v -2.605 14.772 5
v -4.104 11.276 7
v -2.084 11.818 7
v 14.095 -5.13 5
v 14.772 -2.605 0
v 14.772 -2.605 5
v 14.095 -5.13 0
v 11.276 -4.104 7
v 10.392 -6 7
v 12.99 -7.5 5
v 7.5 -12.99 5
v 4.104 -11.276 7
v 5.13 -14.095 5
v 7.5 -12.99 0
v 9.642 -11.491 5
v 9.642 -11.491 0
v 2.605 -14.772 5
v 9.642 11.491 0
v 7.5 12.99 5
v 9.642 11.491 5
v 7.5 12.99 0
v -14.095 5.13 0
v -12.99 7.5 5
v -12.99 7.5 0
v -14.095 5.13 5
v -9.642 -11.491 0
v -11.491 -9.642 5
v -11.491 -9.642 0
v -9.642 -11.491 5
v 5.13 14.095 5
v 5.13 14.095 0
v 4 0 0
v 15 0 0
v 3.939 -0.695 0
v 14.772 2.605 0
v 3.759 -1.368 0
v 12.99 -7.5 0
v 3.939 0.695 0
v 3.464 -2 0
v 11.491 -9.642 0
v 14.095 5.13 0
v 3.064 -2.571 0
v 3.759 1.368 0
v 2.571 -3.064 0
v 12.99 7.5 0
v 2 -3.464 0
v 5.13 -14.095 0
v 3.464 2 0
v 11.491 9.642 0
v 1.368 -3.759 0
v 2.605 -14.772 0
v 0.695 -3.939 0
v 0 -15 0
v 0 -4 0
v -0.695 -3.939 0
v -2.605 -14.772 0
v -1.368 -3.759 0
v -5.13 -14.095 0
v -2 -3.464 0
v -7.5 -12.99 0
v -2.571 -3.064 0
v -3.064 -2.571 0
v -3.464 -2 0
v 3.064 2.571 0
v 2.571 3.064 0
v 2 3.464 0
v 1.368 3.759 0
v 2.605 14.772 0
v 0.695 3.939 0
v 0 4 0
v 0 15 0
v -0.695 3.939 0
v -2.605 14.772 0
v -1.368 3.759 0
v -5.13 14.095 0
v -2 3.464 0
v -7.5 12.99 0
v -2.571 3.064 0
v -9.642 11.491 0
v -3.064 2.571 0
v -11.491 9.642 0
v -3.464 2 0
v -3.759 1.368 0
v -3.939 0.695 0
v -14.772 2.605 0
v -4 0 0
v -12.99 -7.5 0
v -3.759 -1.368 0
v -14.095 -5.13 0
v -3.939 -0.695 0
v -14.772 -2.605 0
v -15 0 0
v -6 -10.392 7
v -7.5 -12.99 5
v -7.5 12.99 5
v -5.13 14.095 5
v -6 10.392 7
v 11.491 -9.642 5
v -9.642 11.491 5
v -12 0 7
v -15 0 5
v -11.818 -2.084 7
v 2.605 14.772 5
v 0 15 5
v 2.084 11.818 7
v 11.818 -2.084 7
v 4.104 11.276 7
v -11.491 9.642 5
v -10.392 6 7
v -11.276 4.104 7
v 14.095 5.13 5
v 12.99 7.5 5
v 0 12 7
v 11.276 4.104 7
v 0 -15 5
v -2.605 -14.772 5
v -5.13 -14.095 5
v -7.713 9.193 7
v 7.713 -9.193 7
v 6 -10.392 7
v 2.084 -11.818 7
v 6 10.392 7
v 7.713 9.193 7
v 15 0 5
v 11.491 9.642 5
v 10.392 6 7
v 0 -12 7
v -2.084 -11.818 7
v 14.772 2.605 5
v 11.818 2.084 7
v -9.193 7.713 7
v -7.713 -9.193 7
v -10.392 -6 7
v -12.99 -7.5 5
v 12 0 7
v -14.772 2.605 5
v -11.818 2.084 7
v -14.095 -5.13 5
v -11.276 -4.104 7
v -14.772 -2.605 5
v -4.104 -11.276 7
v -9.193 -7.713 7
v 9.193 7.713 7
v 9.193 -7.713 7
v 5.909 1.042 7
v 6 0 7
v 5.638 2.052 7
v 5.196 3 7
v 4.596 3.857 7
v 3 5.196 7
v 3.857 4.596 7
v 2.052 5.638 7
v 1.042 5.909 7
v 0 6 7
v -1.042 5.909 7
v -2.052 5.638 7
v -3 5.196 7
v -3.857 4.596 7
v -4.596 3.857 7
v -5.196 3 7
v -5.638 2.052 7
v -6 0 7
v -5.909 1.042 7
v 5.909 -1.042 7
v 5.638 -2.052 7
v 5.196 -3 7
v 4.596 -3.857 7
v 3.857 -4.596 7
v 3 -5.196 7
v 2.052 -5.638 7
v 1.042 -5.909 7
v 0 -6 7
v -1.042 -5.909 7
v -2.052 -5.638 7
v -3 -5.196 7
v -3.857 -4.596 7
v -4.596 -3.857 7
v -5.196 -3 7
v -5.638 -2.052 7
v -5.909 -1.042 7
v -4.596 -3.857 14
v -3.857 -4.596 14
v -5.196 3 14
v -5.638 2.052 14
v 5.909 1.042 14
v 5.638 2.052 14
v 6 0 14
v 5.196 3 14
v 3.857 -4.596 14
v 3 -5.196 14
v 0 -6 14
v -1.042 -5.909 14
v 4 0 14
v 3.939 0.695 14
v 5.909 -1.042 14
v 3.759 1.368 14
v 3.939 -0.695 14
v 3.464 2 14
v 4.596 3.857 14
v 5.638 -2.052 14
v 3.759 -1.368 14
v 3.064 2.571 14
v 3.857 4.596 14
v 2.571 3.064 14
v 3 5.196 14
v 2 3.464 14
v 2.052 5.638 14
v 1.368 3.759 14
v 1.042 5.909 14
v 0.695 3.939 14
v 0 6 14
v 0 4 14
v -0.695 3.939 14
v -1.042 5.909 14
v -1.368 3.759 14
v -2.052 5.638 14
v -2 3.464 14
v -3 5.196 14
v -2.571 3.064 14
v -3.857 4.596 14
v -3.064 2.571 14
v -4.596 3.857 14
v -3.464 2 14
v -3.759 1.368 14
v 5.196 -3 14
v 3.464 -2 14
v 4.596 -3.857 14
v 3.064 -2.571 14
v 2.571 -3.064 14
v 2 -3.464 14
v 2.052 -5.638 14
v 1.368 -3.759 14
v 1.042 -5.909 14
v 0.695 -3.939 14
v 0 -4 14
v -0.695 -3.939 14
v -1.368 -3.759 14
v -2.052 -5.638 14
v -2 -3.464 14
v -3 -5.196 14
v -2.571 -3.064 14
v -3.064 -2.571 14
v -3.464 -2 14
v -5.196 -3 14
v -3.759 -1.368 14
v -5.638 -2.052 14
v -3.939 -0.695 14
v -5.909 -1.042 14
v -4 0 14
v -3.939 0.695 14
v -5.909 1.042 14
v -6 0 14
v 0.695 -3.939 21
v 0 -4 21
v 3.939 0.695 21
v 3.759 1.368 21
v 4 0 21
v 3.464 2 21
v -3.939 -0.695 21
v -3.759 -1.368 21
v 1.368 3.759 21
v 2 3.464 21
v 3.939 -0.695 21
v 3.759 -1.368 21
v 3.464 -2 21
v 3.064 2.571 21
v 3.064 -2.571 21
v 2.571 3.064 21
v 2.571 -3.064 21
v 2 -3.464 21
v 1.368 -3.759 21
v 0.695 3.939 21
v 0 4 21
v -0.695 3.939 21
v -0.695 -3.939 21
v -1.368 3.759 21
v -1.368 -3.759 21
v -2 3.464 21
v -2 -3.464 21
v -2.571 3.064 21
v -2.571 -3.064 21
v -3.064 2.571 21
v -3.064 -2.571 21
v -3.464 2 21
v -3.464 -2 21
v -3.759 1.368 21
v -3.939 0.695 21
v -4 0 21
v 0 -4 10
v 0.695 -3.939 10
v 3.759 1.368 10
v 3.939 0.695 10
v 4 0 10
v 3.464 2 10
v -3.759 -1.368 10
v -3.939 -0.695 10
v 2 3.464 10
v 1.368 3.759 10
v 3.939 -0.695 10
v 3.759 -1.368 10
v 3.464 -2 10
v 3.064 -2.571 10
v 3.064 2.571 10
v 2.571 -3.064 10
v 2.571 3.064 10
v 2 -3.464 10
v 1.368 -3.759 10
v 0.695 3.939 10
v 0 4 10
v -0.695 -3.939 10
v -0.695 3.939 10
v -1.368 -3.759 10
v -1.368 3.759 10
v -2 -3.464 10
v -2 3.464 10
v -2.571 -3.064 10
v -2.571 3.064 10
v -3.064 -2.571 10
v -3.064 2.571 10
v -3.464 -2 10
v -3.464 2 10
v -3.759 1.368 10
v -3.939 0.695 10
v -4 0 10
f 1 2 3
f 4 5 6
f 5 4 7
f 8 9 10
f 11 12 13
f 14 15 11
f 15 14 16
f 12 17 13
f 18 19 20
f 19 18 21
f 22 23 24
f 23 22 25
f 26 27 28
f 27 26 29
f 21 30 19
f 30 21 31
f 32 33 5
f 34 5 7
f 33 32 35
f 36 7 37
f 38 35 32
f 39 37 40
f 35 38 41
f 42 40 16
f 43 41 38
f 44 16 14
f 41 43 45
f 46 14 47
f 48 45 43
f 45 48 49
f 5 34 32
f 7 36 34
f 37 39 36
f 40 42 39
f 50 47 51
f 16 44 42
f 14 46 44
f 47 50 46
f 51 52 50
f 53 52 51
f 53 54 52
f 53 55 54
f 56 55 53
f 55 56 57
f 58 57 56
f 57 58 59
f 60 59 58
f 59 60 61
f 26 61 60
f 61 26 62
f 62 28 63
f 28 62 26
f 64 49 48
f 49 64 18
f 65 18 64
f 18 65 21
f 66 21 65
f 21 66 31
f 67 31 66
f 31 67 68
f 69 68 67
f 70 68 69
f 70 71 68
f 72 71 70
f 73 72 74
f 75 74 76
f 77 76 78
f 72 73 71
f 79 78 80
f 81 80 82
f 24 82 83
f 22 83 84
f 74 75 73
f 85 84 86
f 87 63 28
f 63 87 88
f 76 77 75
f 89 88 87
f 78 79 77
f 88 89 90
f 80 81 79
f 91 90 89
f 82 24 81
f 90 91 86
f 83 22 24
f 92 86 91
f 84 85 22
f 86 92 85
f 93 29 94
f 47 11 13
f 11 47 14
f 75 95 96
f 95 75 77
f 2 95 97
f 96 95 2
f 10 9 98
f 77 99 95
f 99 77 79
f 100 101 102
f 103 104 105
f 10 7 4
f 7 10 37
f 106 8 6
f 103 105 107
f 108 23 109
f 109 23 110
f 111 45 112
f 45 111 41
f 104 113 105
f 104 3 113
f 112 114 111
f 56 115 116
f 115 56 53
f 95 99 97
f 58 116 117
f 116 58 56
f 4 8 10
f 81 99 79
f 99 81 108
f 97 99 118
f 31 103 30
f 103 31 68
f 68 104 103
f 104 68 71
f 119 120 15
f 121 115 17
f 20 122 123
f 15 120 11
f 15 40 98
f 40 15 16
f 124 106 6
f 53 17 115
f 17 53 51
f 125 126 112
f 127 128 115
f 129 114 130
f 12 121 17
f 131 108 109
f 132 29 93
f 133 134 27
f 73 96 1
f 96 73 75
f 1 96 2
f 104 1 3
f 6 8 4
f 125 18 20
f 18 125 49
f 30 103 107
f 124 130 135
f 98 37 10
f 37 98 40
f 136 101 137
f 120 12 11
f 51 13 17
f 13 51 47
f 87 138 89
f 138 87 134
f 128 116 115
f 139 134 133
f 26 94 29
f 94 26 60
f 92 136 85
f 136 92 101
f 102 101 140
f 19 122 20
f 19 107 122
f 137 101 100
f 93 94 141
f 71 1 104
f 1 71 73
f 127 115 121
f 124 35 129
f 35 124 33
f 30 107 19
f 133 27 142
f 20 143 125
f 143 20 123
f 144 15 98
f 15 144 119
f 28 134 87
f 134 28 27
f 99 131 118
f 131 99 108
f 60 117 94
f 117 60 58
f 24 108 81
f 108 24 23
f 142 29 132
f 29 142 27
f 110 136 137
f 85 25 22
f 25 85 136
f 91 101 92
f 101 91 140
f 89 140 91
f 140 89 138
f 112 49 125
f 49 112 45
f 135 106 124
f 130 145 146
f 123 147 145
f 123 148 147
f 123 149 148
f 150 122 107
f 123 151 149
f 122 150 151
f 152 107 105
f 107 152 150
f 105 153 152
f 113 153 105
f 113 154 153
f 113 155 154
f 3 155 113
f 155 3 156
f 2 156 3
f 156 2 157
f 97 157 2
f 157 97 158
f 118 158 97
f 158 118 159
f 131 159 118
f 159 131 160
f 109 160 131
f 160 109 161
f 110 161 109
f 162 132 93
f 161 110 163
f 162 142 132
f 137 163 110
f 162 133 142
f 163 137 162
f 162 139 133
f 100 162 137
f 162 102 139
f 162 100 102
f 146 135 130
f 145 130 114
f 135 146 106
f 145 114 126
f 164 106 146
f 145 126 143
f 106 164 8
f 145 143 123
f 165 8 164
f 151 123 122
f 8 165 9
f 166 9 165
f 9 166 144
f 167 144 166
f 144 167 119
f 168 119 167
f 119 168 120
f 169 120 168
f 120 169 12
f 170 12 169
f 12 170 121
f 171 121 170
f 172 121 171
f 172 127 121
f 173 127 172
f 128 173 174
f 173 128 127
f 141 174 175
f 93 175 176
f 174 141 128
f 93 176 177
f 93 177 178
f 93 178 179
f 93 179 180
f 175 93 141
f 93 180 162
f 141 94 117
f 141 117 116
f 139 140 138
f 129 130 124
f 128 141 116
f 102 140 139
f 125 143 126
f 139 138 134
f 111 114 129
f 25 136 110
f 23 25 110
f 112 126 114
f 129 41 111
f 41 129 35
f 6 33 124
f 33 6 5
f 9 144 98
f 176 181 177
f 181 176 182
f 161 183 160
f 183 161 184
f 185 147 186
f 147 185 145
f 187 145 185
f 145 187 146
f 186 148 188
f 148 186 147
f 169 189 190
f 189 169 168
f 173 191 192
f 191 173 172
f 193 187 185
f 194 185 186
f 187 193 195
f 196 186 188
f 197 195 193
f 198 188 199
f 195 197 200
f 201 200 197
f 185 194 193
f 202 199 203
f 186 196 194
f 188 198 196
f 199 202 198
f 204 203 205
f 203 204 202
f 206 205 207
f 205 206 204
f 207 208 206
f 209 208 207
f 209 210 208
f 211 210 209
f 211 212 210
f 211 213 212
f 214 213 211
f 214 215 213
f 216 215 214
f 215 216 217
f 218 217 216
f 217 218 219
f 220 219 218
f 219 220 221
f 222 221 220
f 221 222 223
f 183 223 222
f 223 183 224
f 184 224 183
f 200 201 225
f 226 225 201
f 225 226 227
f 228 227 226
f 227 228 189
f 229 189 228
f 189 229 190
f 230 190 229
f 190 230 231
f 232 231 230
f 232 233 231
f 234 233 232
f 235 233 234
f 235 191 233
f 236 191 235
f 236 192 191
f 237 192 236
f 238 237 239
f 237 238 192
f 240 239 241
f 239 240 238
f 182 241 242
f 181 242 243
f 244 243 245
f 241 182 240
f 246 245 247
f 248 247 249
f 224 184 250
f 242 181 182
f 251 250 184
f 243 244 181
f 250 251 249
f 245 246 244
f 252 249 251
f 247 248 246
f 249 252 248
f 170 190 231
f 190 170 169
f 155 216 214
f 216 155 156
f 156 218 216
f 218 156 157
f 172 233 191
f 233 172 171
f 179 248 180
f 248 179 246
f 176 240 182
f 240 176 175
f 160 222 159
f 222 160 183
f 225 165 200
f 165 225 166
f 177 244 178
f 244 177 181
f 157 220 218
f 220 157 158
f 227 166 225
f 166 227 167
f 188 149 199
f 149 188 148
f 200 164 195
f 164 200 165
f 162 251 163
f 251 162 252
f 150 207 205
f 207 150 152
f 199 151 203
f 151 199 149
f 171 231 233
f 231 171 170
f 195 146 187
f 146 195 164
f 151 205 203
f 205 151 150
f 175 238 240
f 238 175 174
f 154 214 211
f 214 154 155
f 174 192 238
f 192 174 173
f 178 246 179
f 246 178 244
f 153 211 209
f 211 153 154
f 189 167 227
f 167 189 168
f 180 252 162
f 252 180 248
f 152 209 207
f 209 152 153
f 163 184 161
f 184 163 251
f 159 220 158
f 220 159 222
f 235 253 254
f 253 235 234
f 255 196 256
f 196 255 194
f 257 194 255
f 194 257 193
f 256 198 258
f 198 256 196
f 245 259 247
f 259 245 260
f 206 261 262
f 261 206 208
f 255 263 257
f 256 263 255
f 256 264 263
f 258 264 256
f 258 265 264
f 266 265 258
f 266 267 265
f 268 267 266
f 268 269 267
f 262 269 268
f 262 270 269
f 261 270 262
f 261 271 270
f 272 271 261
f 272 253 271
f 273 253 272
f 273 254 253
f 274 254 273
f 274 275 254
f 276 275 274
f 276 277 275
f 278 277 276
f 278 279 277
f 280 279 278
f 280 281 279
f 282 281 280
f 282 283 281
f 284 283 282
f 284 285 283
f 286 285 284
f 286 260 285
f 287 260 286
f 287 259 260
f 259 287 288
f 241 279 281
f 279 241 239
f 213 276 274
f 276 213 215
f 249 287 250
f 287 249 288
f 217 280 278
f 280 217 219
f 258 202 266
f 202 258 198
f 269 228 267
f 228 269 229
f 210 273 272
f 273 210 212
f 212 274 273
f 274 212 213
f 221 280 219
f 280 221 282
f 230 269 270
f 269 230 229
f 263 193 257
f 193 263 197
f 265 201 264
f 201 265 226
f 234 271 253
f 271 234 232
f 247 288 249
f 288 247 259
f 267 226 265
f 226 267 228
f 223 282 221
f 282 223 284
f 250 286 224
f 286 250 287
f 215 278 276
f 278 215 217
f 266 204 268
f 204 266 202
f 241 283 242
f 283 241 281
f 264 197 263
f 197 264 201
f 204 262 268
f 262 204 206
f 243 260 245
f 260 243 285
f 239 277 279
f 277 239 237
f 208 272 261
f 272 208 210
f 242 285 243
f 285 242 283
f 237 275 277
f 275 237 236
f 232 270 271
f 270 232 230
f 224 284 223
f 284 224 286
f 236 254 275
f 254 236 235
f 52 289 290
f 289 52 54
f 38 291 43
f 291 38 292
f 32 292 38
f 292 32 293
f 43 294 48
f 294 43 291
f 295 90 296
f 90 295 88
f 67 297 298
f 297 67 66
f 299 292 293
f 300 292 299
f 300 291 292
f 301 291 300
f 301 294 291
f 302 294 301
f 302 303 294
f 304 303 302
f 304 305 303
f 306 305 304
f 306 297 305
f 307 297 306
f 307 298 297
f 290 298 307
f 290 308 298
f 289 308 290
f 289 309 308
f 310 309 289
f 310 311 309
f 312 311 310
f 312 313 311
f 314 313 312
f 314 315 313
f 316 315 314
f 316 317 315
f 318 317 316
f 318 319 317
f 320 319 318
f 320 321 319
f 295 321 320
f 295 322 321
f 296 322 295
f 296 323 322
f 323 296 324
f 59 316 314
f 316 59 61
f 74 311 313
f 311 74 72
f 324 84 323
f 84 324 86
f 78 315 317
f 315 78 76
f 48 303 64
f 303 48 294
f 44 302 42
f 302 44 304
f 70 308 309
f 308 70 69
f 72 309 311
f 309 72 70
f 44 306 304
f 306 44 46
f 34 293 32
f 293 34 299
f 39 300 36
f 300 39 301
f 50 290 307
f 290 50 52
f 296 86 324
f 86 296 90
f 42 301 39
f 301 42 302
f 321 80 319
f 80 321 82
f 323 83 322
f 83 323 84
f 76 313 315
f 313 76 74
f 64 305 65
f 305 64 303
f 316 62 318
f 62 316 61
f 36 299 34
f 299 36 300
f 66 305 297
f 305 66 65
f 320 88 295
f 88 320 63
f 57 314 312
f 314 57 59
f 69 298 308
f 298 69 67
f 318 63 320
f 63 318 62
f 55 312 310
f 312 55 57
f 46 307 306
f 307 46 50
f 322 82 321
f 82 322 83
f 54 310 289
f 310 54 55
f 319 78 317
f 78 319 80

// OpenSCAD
$fn=36;
//Radius and height of the plug that have to fit in the screw hole
radius_top=4;
h_top=7;
//Radius and height of the central body
radius_middle_top=6;
h_middle_top=7;
//Radius of the bottom middle part of the body
radius_middle_bottom=12;
h_middle_bottom=2;
//Radius of the foot
radius_bottom=15;
h_bottom=5;
//Radius hole   0 to disable - This is to fit a TPU insert to extend the foot or to have something softer in contact with the table.
radius_hole=4;
//TPU extension  0 to render foot     1 to render TPU insert
Render_insert=0;
TPU_bottom_radius=radius_bottom;
TPU_bottom_thickness=1;
TPU_insert=radius_hole;

if(Render_insert==0)
difference()
{
   union()
   {
      hull()
      {
      cylinder(r=radius_bottom,h=h_bottom);
      cylinder(r=radius_middle_bottom,h=h_bottom+h_middle_bottom);
      }
      cylinder(r=radius_middle_top,h=h_bottom+h_middle_bottom+h_middle_top);
      cylinder(r=radius_top,h=h_bottom+h_middle_bottom+h_middle_top+h_top);
      cylinder(r=radius_top,h=h_bottom+h_middle_bottom+h_middle_top+h_top);
   }

cylinder(r=radius_hole,h=10);
}

if(Render_insert==1)
{
cylinder(r=TPU_bottom_radius,h=TPU_bottom_thickness);
cylinder(r=radius_hole,h=TPU_bottom_thickness+5);
}
